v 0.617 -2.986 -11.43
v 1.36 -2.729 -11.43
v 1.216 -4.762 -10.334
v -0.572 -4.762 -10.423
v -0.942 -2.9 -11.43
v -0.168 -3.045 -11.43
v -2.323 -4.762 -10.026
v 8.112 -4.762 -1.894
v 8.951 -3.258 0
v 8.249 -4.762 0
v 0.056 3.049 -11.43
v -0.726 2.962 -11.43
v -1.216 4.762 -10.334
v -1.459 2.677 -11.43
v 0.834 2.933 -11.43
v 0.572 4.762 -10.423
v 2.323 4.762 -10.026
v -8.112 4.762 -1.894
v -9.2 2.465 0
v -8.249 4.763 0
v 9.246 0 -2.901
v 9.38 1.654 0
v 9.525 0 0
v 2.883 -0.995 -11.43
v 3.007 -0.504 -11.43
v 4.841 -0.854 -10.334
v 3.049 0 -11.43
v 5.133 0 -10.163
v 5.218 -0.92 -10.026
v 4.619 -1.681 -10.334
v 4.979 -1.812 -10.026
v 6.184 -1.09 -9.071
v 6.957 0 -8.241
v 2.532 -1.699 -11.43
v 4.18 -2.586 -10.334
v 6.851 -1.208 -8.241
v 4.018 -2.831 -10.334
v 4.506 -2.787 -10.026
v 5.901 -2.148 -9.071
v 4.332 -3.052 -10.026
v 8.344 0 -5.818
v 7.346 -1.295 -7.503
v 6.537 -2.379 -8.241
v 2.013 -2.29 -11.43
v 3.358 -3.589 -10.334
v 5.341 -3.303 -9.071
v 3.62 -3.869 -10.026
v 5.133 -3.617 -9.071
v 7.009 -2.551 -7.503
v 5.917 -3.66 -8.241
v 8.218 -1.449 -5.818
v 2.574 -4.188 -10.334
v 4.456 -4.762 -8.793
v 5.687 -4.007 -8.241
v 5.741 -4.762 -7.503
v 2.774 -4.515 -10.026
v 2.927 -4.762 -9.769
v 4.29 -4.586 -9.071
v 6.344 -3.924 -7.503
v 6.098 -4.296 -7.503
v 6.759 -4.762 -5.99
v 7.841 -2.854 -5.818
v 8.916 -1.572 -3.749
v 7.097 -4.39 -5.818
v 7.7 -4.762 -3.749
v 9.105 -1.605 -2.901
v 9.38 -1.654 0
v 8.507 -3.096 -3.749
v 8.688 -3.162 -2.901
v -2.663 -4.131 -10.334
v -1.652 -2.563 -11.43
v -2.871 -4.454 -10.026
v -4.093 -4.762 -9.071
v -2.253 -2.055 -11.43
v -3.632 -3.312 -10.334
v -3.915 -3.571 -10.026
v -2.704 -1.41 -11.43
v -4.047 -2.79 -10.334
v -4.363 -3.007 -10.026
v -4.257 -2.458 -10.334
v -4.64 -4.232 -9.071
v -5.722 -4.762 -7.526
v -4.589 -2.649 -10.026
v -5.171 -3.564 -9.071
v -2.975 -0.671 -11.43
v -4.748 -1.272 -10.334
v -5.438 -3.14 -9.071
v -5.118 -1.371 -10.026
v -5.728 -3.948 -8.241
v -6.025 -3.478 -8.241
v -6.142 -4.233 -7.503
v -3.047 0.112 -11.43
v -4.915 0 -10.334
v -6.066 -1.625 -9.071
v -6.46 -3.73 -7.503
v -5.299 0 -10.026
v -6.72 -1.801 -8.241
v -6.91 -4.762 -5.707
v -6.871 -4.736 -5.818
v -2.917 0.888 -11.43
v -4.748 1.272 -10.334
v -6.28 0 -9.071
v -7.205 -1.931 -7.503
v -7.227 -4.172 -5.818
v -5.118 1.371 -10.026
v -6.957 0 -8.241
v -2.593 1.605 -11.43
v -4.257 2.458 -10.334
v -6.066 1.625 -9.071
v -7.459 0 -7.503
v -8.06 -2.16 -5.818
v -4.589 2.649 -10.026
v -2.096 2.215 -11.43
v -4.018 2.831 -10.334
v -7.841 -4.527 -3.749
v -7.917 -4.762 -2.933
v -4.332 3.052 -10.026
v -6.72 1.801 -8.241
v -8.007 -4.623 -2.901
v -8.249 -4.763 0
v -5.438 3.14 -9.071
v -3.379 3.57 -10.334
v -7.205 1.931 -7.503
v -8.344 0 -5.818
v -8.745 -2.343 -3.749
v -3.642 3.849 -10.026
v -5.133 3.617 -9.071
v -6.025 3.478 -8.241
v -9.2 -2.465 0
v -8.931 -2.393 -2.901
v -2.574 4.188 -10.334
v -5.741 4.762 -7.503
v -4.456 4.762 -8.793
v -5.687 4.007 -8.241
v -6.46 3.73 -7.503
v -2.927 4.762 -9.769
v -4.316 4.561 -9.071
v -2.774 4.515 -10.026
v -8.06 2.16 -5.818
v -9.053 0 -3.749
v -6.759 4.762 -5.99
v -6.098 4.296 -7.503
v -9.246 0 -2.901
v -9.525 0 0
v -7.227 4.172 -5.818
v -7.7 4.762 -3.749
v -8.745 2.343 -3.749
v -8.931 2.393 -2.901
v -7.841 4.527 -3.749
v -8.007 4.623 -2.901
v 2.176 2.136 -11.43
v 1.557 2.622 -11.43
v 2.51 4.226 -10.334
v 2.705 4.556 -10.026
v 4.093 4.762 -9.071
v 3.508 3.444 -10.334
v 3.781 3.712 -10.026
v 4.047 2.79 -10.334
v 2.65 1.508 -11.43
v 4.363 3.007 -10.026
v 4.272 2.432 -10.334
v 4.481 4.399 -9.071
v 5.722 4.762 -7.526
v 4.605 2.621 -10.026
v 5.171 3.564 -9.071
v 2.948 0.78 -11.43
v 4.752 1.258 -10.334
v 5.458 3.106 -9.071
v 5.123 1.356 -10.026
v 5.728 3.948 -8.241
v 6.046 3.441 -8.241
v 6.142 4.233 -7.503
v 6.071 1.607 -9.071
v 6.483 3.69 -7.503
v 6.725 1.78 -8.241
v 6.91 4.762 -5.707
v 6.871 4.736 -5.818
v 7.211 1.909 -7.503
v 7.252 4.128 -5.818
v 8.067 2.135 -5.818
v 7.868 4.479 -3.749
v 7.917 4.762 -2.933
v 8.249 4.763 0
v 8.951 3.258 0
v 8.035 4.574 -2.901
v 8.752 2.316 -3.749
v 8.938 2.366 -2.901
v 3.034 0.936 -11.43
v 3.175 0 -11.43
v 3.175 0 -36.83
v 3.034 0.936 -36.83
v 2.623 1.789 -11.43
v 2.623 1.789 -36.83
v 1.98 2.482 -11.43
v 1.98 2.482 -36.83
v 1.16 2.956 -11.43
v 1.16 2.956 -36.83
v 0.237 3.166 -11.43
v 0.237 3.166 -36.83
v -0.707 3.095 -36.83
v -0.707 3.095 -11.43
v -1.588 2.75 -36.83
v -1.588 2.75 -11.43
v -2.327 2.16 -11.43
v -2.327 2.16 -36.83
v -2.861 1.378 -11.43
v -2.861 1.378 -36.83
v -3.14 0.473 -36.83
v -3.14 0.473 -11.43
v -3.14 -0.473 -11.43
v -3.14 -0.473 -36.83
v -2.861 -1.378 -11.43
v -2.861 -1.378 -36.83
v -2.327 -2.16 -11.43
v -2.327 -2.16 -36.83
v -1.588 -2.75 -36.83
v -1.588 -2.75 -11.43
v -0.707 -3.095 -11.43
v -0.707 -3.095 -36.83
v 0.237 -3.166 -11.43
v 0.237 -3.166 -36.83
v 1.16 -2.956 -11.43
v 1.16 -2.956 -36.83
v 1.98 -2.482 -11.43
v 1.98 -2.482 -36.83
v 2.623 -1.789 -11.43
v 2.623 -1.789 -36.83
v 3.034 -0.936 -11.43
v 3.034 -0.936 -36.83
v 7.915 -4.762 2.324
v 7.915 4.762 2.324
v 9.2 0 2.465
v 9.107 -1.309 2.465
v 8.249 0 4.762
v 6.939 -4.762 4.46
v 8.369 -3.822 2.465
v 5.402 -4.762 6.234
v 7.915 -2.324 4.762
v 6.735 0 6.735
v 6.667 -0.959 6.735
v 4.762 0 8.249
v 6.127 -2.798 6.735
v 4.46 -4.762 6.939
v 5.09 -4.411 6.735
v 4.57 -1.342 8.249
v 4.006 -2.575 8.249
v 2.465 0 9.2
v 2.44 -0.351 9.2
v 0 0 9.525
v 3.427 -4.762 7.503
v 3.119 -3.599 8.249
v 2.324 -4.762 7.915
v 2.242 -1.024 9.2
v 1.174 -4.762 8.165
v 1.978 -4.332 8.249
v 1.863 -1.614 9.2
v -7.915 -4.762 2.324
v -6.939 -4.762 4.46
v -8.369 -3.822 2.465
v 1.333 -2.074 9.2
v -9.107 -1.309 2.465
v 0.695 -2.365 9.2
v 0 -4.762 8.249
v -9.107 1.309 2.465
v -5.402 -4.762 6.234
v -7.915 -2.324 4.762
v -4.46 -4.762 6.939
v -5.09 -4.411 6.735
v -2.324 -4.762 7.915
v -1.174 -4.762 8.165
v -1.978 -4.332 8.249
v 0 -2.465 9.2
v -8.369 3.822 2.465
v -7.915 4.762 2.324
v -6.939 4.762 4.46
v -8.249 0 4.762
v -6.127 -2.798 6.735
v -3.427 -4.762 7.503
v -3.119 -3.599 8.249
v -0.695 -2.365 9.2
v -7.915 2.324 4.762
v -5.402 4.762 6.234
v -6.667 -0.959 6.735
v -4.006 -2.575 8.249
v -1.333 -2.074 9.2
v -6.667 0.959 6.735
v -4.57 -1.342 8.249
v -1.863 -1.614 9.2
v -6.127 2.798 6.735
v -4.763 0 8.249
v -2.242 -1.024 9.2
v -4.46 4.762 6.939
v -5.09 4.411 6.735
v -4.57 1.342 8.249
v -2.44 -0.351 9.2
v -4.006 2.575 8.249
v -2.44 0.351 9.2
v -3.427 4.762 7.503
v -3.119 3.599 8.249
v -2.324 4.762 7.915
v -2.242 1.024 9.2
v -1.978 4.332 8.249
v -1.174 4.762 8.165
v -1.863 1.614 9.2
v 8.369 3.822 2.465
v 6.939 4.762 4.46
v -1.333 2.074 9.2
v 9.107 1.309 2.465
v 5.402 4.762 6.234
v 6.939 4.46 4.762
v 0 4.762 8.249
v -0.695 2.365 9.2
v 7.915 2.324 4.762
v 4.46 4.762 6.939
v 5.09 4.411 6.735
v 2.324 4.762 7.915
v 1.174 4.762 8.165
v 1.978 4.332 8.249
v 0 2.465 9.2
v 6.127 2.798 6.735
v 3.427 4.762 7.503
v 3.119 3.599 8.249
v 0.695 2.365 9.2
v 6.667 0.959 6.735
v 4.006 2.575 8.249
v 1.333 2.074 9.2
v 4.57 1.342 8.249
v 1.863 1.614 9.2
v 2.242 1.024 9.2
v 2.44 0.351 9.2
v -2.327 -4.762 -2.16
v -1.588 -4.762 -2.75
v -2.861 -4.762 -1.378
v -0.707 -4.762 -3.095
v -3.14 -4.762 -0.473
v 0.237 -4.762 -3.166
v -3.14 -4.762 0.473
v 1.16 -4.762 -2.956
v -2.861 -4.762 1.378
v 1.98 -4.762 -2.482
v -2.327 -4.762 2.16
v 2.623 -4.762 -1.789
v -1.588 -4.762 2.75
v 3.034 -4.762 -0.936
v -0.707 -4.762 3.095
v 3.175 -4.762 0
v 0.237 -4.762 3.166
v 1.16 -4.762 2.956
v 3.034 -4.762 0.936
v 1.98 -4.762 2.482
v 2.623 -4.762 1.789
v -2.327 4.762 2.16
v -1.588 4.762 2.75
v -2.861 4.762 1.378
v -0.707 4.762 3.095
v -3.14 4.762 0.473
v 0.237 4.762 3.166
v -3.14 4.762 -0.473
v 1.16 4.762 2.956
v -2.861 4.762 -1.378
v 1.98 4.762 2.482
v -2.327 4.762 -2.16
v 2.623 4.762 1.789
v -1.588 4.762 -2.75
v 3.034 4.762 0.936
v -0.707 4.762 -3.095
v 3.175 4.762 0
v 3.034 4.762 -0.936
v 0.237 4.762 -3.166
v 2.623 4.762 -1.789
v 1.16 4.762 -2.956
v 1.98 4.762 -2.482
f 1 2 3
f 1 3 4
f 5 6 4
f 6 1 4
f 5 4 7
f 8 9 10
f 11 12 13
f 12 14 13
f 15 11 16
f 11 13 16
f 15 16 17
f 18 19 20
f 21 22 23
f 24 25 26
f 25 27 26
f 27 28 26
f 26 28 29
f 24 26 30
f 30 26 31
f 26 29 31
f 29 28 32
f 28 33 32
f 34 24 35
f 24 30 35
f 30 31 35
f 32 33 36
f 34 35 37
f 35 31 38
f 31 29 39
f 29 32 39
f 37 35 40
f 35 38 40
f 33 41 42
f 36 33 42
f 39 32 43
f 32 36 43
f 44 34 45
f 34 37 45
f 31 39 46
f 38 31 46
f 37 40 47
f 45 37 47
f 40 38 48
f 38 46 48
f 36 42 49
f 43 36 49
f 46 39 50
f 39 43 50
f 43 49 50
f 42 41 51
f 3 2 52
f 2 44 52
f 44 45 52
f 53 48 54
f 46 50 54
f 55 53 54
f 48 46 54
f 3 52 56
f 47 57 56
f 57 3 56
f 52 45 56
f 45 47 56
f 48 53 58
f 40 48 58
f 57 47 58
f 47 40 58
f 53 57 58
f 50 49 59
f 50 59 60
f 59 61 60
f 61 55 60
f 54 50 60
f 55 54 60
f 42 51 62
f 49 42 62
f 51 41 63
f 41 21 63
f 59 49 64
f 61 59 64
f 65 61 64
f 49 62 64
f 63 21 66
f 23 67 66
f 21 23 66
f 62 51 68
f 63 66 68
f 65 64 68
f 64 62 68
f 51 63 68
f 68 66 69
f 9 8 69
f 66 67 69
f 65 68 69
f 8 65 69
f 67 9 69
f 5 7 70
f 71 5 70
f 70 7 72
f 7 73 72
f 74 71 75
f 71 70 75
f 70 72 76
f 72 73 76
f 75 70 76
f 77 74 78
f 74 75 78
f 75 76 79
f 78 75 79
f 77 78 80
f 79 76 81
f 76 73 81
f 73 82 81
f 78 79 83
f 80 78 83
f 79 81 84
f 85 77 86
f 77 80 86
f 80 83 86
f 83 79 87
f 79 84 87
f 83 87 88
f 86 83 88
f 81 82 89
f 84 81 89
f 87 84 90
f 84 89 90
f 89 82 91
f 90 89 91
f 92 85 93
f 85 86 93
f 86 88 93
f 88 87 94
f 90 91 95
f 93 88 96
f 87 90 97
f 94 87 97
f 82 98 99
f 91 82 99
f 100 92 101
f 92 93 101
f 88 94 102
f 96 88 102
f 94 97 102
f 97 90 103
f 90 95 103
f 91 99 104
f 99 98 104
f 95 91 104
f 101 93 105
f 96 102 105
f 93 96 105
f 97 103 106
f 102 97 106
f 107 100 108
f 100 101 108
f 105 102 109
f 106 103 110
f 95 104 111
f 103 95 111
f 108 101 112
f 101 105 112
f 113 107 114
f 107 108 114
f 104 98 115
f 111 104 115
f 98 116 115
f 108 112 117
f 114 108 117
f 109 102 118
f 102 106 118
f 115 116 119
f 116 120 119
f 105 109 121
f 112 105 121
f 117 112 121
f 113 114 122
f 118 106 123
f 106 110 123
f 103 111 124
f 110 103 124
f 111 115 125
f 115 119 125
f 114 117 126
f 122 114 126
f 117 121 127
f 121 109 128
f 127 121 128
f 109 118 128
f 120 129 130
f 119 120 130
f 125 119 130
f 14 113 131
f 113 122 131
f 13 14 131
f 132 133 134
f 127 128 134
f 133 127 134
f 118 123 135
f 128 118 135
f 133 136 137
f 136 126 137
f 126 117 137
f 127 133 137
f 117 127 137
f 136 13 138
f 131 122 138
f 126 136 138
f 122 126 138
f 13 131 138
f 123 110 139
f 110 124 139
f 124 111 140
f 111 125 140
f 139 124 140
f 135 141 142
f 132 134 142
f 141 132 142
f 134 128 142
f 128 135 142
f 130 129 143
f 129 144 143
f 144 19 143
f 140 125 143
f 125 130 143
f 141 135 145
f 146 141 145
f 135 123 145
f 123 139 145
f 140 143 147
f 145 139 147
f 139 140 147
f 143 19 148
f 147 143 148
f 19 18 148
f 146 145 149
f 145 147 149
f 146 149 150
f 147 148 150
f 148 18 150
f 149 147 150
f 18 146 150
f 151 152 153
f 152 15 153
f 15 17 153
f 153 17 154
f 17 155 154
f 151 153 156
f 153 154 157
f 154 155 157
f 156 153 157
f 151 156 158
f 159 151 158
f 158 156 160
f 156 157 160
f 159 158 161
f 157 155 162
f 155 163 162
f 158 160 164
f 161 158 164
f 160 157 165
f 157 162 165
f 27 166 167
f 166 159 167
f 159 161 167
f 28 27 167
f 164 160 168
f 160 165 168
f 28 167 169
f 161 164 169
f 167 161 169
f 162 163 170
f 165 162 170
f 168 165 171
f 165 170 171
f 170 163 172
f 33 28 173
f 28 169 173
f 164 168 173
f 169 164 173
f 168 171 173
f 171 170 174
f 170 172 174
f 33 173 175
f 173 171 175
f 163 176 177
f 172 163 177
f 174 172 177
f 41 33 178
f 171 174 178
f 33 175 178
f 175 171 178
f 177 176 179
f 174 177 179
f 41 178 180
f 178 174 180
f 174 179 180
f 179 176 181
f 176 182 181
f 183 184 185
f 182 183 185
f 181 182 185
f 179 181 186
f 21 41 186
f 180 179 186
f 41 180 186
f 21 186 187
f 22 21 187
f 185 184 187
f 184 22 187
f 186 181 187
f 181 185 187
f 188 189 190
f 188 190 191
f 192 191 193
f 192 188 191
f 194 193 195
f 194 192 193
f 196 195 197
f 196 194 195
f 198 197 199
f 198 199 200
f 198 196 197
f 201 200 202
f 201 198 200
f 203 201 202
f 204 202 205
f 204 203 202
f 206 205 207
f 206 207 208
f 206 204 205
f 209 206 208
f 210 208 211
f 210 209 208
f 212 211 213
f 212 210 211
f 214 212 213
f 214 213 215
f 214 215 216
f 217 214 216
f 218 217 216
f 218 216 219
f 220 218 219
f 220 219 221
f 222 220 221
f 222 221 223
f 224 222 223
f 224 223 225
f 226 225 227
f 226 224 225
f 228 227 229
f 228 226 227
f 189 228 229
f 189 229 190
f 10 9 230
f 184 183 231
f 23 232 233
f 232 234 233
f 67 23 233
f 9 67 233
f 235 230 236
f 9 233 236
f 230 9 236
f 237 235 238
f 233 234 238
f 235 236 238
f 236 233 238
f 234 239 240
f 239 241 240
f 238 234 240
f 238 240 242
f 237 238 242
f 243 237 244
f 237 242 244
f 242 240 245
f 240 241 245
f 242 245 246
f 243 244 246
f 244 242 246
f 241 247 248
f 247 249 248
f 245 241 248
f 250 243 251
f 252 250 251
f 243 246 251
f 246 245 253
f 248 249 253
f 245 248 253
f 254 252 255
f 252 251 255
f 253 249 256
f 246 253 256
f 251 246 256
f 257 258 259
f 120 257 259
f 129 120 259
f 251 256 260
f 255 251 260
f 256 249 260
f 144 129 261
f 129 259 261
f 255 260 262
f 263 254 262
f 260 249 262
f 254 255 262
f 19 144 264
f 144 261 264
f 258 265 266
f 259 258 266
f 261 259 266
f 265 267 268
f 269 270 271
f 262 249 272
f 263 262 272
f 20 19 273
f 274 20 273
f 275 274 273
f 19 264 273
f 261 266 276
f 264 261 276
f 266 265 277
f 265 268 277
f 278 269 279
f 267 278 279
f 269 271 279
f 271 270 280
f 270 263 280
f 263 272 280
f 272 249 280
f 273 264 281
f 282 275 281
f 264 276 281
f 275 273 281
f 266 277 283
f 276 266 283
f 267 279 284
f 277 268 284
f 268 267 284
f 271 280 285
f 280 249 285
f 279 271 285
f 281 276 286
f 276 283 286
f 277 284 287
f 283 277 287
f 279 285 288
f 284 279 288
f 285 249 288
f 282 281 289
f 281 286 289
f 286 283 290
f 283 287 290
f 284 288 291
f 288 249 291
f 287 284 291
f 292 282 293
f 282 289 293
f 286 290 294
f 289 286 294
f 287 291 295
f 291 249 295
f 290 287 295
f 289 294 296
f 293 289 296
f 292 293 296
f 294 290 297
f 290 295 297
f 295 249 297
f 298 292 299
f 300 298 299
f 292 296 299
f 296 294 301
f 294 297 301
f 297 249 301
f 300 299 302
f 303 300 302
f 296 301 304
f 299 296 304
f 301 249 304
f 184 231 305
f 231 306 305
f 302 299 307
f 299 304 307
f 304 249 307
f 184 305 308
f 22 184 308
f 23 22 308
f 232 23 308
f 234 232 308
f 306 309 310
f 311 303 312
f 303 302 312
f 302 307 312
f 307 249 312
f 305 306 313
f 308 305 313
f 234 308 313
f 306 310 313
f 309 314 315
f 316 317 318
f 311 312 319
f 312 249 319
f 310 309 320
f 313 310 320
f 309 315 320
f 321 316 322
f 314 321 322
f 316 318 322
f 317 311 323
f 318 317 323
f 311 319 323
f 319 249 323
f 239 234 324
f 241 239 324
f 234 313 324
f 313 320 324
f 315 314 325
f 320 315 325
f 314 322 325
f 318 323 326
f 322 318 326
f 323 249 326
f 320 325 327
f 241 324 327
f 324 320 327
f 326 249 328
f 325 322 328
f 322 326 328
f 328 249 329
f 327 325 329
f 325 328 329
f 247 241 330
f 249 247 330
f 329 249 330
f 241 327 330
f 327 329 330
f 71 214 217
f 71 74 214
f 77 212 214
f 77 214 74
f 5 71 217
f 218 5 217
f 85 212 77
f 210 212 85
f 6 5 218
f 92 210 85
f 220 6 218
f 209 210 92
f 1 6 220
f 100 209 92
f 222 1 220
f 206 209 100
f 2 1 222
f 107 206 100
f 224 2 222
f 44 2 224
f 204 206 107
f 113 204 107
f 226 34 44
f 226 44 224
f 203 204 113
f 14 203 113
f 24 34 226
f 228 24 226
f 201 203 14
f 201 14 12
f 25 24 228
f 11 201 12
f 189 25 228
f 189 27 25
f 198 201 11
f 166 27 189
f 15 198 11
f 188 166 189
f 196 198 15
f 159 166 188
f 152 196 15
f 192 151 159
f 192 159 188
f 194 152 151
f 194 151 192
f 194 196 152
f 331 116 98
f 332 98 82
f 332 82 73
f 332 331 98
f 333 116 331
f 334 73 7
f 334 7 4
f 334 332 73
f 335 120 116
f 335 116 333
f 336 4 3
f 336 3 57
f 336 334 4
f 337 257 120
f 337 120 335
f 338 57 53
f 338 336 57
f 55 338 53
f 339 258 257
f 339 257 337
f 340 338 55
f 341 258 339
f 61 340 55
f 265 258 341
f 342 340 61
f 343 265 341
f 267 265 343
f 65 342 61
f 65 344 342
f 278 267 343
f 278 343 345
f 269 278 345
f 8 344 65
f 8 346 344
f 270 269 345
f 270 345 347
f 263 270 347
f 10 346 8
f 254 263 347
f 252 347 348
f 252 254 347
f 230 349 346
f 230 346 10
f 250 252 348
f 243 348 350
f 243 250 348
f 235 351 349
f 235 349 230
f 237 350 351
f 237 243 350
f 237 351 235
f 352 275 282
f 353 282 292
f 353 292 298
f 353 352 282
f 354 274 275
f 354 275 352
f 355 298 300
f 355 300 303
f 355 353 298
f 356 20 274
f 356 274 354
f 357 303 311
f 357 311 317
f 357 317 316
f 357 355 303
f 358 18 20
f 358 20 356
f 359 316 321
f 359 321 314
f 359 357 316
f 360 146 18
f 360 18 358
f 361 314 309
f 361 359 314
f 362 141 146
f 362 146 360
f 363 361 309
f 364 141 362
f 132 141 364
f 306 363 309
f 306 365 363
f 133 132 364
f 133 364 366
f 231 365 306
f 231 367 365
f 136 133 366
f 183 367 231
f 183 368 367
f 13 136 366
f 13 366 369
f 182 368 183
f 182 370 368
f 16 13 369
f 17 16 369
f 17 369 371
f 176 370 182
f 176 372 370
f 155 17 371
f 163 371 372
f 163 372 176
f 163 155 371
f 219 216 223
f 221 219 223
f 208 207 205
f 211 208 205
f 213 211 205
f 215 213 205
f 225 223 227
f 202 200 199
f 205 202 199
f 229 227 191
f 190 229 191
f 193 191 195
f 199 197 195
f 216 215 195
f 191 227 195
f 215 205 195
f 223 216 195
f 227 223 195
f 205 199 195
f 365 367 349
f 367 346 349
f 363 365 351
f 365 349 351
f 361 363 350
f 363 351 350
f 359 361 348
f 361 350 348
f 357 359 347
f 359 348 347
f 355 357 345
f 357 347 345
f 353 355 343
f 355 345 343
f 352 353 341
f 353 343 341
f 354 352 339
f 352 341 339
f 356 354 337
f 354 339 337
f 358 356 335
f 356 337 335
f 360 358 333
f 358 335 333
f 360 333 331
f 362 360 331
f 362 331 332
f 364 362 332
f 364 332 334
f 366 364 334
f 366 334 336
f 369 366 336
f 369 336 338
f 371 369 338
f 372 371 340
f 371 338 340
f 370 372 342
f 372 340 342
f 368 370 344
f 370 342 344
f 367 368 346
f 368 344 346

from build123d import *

# Parameters (mm, degrees)
F2_W     = 19.05
F2_H     = 6.35
F3_DEPTH = 12.7
F4_R     = 3.175
F5_DEPTH = 12.7
F7_R     = 3.175
F8_DEPTH = 25.4


with BuildPart() as f1:
    # F0 (on Front) → F1 (revolve)
    with BuildSketch(Plane.XZ):
        with BuildLine():
            add(Edge.make_bspline(
                [(0, -12.065), (9.525, -12.065), (9.525, 0)],
                knots=[3.1415926536, 3.1415926536, 3.1415926536, 4.7123889804, 4.7123889804, 4.7123889804], degree=2, weights=[1, 0.7071067812, 1]))
            ThreePointArc((9.525, 0), (6.7351920908, 6.7351920908), (0, 9.525))
            Line((0, 9.525), (0, -12.065))
        make_face()
    revolve(axis=Axis((0, 0, 2.0303288475), (0, 0, -1)))

    # F2 (on Top) → F3 (cut, symmetric)
    with BuildSketch(Plane.XY):
        with Locations((0, 7.9375)):
            Rectangle(F2_W, F2_H)
        with Locations((0, -7.9375)):
            Rectangle(F2_W, F2_H)
    extrude(amount=F3_DEPTH, both=True, mode=Mode.SUBTRACT)

    # F4 (on Front) → F5 (cut, symmetric)
    with BuildSketch(Plane.XZ):
        Circle(F4_R)
    extrude(amount=F5_DEPTH, both=True, mode=Mode.SUBTRACT)

    # F7 (on offset) → F8 (join)
    with BuildSketch(Plane.XY.offset(-11.43)):
        Circle(F7_R)
    extrude(amount=-F8_DEPTH)


solid = f1.part
